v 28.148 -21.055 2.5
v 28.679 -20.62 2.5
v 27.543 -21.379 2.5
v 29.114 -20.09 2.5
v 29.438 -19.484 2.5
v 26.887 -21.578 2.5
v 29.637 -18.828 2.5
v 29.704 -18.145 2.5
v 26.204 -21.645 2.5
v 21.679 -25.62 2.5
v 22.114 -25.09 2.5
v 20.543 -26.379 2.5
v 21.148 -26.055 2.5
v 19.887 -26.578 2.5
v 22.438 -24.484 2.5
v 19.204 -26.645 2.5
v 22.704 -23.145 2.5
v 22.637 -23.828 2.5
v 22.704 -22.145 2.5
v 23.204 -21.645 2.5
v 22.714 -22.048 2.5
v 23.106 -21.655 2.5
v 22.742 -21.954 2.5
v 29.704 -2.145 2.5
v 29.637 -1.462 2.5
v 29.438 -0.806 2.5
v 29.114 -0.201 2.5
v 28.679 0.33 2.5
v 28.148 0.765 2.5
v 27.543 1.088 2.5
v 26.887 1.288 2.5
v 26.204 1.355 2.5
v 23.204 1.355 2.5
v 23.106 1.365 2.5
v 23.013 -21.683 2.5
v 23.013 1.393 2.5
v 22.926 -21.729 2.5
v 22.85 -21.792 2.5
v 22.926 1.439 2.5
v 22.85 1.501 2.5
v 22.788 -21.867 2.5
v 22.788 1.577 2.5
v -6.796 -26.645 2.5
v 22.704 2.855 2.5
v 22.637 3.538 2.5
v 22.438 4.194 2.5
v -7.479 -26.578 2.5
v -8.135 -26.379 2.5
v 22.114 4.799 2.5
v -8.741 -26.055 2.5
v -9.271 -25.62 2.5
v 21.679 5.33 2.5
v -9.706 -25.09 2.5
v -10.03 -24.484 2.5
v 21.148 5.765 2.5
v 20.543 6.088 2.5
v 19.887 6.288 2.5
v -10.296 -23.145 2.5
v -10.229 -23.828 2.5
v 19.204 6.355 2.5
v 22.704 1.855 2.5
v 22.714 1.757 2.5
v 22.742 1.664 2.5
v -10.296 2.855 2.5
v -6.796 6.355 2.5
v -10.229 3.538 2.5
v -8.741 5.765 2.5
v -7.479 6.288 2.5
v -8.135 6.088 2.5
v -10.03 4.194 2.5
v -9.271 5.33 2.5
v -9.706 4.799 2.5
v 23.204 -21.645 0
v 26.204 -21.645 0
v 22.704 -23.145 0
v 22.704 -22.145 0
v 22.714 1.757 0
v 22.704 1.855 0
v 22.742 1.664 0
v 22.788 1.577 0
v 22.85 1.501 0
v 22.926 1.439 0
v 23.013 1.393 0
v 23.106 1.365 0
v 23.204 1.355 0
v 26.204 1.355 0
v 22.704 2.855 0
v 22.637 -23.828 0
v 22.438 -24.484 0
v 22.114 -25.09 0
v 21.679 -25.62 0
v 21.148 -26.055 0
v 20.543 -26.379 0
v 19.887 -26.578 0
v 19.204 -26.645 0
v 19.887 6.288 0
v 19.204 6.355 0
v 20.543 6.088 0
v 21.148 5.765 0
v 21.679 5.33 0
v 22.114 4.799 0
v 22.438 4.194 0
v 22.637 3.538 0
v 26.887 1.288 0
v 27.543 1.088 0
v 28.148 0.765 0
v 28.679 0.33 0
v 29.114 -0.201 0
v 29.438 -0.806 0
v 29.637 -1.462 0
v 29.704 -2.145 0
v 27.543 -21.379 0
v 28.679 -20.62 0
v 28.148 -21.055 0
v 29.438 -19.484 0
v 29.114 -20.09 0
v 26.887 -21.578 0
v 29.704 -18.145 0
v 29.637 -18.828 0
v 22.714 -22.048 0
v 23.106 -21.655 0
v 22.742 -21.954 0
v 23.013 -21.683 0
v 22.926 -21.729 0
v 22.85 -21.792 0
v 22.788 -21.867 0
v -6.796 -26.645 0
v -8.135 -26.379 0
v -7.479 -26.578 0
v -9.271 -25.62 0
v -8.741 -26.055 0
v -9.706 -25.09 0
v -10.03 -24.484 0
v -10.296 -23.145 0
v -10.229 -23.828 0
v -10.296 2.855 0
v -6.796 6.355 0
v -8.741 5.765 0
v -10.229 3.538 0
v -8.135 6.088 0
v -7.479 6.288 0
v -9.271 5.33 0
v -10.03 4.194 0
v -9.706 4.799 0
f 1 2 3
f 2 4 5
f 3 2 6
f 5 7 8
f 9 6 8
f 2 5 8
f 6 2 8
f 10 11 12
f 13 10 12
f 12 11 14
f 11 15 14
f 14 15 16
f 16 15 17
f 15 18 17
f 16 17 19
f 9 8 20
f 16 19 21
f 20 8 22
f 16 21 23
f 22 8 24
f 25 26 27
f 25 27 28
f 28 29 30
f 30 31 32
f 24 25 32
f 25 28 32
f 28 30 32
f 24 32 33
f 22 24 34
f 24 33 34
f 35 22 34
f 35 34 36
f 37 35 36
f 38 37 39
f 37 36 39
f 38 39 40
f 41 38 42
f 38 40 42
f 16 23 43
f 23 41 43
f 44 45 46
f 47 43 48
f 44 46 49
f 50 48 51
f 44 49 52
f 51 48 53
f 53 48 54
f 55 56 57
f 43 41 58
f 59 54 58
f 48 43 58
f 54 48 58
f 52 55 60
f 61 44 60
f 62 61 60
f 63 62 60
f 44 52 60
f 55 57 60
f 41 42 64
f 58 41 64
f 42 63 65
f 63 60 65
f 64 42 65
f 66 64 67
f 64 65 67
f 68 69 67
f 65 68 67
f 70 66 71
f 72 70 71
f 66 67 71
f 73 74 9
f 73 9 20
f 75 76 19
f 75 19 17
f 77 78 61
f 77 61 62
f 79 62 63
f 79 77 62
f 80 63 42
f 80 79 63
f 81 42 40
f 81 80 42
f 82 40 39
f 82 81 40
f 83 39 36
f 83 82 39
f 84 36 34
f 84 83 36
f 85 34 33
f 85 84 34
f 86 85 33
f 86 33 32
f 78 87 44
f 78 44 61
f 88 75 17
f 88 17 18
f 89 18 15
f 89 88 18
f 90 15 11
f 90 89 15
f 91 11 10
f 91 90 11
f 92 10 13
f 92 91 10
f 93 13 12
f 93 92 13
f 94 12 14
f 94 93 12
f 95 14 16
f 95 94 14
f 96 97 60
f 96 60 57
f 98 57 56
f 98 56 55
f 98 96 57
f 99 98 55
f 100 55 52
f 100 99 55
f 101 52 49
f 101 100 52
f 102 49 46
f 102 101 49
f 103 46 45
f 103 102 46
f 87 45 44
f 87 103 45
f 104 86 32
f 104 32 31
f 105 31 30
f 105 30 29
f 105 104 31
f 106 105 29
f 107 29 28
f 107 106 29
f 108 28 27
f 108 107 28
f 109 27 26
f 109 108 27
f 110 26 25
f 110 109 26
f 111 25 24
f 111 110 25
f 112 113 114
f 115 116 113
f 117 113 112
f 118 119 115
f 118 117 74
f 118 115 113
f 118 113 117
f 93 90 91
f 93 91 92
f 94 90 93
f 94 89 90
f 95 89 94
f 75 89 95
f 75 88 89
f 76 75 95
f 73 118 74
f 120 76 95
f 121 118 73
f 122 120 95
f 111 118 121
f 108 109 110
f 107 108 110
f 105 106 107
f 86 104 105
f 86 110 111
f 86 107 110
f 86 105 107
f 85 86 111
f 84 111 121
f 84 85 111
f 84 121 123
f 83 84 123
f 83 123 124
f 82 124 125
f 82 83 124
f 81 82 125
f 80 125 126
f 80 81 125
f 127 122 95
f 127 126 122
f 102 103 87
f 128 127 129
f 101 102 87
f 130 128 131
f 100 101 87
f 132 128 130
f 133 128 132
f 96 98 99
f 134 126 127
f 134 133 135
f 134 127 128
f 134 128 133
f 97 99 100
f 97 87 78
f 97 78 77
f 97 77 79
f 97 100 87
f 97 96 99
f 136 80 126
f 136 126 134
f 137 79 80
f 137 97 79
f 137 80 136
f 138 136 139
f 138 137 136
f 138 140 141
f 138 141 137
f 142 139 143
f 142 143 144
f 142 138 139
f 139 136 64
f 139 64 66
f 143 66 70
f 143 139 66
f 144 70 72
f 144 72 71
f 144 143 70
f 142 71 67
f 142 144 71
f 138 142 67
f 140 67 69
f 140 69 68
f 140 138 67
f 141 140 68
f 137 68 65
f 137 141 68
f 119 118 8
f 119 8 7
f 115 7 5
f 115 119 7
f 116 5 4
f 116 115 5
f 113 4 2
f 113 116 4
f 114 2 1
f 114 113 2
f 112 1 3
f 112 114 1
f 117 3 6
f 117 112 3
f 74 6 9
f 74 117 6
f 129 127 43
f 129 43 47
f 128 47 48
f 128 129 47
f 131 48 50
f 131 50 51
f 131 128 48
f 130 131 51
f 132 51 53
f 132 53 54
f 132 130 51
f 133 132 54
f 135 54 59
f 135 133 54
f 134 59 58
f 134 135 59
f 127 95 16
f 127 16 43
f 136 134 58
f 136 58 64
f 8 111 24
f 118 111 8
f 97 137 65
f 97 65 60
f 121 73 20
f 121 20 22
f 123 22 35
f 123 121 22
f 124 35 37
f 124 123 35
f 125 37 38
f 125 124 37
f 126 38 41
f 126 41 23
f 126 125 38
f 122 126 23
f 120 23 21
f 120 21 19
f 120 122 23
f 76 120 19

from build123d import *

# Parameters (mm, degrees)
BOSS_EXTRUDE2_DEPTH = 2.5


with BuildPart() as part:
    # Glass_Sketch → Boss-Extrude2 (new body)
    with BuildSketch(Plane.XY):
        with BuildLine():
            Line((-10.296075652, -23.145089286), (-10.296075652, 2.854910714))
            ThreePointArc((-10.296075652, 2.854910714), (-9.270949386, 5.329784448), (-6.796075652, 6.354910714))
            Line((-6.796075652, 6.354910714), (19.203924348, 6.354910714))
            ThreePointArc((19.203924348, 6.354910714), (21.678798083, 5.329784448), (22.703924348, 2.854910714))
            Line((22.703924348, 2.854910714), (22.703924348, 1.854910714))
            ThreePointArc((22.703924348, 1.854910714), (22.850370958, 1.501357324), (23.203924348, 1.354910714))
            Line((23.203924348, 1.354910714), (26.203924348, 1.354910714))
            ThreePointArc((26.203924348, 1.354910714), (28.678798083, 0.329784448), (29.703924348, -2.145089286))
            Line((29.703924348, -2.145089286), (29.703924348, -18.145089286))
            ThreePointArc((29.703924348, -18.145089286), (28.678798083, -20.61996302), (26.203924348, -21.645089286))
            Line((26.203924348, -21.645089286), (23.203924348, -21.645089286))
            ThreePointArc((23.203924348, -21.645089286), (22.850370958, -21.791535895), (22.703924348, -22.145089286))
            Line((22.703924348, -22.145089286), (22.703924348, -23.145089286))
            ThreePointArc((22.703924348, -23.145089286), (21.678798083, -25.61996302), (19.203924348, -26.645089286))
            Line((19.203924348, -26.645089286), (-6.796075652, -26.645089286))
            ThreePointArc((-6.796075652, -26.645089286), (-9.270949386, -25.61996302), (-10.296075652, -23.145089286))
        make_face()
    extrude(amount=BOSS_EXTRUDE2_DEPTH)


solid = part.part
